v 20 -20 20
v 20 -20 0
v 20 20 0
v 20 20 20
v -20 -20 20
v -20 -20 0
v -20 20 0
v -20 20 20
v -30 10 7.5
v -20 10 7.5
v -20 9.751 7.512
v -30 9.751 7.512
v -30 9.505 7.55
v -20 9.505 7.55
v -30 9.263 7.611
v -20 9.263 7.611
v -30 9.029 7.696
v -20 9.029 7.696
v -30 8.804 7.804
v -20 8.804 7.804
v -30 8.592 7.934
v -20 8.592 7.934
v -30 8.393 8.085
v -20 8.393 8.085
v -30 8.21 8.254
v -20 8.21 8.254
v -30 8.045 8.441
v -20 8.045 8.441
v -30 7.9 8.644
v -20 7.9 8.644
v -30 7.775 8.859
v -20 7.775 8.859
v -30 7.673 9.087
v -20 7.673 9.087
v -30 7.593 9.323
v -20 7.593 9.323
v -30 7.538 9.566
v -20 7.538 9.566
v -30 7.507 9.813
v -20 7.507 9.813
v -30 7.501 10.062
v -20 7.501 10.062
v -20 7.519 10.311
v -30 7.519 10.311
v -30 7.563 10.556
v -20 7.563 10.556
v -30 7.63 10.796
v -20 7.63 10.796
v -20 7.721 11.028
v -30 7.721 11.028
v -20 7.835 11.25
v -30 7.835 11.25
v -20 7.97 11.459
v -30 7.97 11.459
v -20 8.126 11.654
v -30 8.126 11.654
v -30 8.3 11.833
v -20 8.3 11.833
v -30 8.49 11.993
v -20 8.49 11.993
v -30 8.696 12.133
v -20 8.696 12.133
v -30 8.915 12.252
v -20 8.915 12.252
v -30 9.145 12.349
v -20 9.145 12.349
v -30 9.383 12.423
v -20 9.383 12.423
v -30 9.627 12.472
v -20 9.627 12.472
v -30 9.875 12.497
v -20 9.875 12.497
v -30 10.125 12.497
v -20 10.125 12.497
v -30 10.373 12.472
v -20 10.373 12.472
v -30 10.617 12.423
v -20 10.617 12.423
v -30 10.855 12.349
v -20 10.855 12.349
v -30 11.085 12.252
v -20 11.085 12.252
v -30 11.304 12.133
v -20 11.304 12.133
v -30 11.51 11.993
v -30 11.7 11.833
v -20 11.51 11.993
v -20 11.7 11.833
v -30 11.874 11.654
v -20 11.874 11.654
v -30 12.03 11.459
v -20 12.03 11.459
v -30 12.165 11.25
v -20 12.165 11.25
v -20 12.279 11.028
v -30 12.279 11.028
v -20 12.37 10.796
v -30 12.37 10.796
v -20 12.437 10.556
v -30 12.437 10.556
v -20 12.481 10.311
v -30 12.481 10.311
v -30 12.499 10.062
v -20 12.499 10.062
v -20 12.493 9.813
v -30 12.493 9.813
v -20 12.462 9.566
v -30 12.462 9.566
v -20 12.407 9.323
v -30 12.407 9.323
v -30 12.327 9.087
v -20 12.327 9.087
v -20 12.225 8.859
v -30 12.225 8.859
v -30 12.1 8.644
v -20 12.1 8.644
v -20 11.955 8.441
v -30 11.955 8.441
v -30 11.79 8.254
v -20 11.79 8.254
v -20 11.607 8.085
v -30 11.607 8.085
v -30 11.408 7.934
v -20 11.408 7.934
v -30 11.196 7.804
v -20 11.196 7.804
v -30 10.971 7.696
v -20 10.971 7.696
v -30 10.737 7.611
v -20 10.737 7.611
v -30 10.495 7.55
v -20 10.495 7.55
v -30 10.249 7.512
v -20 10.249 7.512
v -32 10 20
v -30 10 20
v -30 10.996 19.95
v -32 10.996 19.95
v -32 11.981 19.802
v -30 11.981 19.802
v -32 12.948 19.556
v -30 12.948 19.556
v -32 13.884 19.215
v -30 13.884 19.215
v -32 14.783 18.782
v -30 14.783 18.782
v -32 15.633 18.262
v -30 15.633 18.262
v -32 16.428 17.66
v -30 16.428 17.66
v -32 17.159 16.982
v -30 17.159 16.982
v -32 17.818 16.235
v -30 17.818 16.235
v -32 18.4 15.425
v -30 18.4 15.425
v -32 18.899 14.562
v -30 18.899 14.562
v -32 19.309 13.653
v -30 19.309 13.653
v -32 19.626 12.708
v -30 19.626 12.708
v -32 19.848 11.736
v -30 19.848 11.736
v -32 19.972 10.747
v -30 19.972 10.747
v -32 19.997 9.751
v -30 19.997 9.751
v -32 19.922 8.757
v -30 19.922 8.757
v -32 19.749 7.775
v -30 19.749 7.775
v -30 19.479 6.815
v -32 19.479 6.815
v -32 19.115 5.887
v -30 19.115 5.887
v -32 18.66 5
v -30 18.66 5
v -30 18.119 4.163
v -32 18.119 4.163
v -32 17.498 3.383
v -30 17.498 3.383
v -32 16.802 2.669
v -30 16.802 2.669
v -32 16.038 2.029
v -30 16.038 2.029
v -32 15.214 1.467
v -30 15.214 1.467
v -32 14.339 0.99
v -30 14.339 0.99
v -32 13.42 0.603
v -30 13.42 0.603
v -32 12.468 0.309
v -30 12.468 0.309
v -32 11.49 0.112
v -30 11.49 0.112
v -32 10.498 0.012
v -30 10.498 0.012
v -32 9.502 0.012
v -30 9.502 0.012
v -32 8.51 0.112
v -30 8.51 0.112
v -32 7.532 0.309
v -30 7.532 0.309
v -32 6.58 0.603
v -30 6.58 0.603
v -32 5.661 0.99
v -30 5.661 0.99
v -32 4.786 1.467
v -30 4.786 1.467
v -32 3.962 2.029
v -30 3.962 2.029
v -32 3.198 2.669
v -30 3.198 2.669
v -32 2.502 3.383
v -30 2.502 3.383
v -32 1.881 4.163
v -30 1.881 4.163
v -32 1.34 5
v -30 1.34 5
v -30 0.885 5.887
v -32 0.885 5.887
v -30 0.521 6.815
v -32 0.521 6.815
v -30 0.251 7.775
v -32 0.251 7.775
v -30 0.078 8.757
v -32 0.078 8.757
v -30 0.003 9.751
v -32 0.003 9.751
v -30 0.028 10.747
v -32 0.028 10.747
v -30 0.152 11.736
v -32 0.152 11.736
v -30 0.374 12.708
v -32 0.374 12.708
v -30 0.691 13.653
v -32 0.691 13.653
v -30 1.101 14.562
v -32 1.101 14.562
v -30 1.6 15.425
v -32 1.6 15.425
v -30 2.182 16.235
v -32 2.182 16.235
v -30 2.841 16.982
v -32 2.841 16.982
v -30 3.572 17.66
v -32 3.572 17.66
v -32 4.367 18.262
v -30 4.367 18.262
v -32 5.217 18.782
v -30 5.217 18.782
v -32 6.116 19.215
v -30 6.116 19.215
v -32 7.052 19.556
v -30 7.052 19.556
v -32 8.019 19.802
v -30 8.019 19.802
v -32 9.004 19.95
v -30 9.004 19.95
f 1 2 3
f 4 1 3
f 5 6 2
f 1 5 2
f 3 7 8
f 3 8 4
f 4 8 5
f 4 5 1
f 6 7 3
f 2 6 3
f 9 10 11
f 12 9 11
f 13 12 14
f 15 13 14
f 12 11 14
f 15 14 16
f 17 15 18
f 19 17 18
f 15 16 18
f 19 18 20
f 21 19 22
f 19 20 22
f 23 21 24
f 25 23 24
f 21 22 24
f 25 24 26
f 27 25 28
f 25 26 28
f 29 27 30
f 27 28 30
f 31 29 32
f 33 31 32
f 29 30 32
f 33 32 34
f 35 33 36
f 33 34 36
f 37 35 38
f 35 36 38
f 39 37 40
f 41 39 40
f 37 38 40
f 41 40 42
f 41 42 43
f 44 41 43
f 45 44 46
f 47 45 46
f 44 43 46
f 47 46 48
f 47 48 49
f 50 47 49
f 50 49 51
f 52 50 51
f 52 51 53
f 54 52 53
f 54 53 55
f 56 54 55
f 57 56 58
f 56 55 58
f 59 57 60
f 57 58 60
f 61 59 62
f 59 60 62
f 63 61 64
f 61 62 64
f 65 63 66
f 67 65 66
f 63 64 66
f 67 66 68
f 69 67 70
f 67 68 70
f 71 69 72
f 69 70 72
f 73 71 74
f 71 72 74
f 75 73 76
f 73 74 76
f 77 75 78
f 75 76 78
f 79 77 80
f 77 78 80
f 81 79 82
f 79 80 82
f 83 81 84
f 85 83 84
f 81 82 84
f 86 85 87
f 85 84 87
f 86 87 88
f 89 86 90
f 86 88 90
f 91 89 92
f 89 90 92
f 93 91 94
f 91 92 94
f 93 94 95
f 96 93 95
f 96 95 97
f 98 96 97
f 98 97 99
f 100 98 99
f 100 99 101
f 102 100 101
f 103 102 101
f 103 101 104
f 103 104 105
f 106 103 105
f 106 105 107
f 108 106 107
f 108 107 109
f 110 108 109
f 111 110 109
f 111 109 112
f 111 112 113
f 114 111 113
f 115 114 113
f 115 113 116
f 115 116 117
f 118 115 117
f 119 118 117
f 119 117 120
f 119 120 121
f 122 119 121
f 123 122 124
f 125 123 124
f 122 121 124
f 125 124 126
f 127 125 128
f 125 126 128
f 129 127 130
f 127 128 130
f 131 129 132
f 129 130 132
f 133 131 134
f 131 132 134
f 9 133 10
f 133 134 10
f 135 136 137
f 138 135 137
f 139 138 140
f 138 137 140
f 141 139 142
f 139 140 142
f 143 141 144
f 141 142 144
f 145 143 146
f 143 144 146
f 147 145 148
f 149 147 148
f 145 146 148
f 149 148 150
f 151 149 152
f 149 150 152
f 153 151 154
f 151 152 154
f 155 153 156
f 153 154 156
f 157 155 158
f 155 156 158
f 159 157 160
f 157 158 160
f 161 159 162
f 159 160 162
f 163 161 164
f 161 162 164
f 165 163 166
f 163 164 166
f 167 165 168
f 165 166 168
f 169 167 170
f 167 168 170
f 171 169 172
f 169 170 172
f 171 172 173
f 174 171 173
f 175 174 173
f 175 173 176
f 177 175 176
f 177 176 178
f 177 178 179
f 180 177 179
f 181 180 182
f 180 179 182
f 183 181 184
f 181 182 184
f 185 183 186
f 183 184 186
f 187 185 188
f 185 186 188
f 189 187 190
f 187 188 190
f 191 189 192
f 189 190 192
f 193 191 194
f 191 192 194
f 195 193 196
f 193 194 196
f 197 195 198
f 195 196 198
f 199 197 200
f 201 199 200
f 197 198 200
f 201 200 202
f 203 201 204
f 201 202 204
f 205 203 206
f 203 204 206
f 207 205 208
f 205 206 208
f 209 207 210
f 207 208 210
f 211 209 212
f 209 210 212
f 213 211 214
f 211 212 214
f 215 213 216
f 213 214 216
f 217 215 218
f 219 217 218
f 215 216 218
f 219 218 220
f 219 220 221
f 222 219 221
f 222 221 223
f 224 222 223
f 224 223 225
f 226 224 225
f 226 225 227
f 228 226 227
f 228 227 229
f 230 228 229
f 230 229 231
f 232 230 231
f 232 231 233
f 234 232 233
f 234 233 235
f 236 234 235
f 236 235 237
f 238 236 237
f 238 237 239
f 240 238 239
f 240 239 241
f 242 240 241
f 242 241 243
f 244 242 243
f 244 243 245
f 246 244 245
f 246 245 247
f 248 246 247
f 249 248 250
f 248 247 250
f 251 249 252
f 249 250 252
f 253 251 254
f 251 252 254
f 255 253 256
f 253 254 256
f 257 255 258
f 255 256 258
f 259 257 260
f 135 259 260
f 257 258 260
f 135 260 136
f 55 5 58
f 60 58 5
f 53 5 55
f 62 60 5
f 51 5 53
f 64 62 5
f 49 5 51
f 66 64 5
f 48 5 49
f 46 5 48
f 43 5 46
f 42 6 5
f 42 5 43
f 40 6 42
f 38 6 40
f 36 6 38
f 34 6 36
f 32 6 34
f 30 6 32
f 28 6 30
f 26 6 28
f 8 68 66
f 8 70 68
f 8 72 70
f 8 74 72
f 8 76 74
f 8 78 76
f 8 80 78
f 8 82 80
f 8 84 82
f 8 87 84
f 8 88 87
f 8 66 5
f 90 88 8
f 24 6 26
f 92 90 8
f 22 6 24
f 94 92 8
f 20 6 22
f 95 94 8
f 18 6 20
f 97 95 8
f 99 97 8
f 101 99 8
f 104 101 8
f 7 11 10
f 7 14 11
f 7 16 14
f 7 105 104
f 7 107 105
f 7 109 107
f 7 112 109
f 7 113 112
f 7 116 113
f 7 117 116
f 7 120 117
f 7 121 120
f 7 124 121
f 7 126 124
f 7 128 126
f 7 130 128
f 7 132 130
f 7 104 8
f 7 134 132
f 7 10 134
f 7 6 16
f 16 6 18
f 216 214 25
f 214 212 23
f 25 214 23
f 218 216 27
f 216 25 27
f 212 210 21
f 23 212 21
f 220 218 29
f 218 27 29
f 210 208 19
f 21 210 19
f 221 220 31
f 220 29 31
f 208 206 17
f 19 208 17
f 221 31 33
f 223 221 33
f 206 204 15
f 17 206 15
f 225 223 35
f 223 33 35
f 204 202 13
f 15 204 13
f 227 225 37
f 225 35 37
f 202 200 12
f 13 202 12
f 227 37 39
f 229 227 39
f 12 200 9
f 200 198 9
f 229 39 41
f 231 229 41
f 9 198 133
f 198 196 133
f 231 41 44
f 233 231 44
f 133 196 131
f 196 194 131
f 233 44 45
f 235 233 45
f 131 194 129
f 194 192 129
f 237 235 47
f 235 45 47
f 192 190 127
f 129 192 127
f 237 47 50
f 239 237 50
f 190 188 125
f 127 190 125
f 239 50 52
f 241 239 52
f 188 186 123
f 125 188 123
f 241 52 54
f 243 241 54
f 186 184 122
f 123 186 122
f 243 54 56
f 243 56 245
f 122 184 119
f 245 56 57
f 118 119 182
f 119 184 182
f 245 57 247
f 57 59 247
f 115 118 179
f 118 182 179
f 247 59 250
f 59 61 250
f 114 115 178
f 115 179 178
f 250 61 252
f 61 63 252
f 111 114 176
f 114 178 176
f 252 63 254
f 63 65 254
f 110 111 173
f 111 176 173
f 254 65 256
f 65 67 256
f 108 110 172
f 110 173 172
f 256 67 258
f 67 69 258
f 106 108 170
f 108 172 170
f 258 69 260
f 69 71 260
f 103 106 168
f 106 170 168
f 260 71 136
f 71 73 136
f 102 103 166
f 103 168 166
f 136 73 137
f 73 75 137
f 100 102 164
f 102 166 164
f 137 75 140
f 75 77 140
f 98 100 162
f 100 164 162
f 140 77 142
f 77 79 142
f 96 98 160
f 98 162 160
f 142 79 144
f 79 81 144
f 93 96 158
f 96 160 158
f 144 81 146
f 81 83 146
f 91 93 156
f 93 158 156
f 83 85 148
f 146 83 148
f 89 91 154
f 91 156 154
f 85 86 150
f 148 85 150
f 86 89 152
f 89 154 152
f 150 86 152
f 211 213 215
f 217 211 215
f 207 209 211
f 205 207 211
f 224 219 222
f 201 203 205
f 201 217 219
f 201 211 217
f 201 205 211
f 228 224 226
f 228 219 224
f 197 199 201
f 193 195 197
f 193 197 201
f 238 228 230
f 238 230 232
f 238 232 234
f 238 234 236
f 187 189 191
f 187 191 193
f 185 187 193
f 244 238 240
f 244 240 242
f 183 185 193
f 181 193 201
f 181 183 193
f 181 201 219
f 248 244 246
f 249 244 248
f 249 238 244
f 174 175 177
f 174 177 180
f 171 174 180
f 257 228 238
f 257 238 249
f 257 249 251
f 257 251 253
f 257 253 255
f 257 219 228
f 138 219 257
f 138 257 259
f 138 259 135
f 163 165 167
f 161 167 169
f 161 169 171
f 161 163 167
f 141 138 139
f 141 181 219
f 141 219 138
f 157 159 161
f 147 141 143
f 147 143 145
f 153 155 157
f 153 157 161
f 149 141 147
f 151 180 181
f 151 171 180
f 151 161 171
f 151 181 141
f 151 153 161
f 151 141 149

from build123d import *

# Parameters (mm, degrees)
SKETCH_1_W      = 40
SKETCH_1_H      = 40
EXTRUDE_1_DEPTH = 20
SKETCH_2_R      = 2.5
EXTRUDE_2_DEPTH = 10
SKETCH_3_R      = 10
EXTRUDE_3_DEPTH = 2


with BuildPart() as part:
    # 草图1 → 凸台-拉伸1 (new body)
    with BuildSketch(Plane.XY):
        Rectangle(SKETCH_1_W, SKETCH_1_H)
    extrude(amount=EXTRUDE_1_DEPTH)

    # 草图2 → 凸台-拉伸2 (add)
    with BuildSketch(Plane.ZY.offset(20)):
        with Locations(Location((10, 10, 0), (0, 0, 180))):
            Circle(SKETCH_2_R)
    extrude(amount=EXTRUDE_2_DEPTH)

    # 草图3 → 凸台-拉伸3 (add)
    with BuildSketch(Plane.ZY.offset(30)):
        with Locations((10, 10)):
            Circle(SKETCH_3_R)
    extrude(amount=EXTRUDE_3_DEPTH)


solid = part.part
